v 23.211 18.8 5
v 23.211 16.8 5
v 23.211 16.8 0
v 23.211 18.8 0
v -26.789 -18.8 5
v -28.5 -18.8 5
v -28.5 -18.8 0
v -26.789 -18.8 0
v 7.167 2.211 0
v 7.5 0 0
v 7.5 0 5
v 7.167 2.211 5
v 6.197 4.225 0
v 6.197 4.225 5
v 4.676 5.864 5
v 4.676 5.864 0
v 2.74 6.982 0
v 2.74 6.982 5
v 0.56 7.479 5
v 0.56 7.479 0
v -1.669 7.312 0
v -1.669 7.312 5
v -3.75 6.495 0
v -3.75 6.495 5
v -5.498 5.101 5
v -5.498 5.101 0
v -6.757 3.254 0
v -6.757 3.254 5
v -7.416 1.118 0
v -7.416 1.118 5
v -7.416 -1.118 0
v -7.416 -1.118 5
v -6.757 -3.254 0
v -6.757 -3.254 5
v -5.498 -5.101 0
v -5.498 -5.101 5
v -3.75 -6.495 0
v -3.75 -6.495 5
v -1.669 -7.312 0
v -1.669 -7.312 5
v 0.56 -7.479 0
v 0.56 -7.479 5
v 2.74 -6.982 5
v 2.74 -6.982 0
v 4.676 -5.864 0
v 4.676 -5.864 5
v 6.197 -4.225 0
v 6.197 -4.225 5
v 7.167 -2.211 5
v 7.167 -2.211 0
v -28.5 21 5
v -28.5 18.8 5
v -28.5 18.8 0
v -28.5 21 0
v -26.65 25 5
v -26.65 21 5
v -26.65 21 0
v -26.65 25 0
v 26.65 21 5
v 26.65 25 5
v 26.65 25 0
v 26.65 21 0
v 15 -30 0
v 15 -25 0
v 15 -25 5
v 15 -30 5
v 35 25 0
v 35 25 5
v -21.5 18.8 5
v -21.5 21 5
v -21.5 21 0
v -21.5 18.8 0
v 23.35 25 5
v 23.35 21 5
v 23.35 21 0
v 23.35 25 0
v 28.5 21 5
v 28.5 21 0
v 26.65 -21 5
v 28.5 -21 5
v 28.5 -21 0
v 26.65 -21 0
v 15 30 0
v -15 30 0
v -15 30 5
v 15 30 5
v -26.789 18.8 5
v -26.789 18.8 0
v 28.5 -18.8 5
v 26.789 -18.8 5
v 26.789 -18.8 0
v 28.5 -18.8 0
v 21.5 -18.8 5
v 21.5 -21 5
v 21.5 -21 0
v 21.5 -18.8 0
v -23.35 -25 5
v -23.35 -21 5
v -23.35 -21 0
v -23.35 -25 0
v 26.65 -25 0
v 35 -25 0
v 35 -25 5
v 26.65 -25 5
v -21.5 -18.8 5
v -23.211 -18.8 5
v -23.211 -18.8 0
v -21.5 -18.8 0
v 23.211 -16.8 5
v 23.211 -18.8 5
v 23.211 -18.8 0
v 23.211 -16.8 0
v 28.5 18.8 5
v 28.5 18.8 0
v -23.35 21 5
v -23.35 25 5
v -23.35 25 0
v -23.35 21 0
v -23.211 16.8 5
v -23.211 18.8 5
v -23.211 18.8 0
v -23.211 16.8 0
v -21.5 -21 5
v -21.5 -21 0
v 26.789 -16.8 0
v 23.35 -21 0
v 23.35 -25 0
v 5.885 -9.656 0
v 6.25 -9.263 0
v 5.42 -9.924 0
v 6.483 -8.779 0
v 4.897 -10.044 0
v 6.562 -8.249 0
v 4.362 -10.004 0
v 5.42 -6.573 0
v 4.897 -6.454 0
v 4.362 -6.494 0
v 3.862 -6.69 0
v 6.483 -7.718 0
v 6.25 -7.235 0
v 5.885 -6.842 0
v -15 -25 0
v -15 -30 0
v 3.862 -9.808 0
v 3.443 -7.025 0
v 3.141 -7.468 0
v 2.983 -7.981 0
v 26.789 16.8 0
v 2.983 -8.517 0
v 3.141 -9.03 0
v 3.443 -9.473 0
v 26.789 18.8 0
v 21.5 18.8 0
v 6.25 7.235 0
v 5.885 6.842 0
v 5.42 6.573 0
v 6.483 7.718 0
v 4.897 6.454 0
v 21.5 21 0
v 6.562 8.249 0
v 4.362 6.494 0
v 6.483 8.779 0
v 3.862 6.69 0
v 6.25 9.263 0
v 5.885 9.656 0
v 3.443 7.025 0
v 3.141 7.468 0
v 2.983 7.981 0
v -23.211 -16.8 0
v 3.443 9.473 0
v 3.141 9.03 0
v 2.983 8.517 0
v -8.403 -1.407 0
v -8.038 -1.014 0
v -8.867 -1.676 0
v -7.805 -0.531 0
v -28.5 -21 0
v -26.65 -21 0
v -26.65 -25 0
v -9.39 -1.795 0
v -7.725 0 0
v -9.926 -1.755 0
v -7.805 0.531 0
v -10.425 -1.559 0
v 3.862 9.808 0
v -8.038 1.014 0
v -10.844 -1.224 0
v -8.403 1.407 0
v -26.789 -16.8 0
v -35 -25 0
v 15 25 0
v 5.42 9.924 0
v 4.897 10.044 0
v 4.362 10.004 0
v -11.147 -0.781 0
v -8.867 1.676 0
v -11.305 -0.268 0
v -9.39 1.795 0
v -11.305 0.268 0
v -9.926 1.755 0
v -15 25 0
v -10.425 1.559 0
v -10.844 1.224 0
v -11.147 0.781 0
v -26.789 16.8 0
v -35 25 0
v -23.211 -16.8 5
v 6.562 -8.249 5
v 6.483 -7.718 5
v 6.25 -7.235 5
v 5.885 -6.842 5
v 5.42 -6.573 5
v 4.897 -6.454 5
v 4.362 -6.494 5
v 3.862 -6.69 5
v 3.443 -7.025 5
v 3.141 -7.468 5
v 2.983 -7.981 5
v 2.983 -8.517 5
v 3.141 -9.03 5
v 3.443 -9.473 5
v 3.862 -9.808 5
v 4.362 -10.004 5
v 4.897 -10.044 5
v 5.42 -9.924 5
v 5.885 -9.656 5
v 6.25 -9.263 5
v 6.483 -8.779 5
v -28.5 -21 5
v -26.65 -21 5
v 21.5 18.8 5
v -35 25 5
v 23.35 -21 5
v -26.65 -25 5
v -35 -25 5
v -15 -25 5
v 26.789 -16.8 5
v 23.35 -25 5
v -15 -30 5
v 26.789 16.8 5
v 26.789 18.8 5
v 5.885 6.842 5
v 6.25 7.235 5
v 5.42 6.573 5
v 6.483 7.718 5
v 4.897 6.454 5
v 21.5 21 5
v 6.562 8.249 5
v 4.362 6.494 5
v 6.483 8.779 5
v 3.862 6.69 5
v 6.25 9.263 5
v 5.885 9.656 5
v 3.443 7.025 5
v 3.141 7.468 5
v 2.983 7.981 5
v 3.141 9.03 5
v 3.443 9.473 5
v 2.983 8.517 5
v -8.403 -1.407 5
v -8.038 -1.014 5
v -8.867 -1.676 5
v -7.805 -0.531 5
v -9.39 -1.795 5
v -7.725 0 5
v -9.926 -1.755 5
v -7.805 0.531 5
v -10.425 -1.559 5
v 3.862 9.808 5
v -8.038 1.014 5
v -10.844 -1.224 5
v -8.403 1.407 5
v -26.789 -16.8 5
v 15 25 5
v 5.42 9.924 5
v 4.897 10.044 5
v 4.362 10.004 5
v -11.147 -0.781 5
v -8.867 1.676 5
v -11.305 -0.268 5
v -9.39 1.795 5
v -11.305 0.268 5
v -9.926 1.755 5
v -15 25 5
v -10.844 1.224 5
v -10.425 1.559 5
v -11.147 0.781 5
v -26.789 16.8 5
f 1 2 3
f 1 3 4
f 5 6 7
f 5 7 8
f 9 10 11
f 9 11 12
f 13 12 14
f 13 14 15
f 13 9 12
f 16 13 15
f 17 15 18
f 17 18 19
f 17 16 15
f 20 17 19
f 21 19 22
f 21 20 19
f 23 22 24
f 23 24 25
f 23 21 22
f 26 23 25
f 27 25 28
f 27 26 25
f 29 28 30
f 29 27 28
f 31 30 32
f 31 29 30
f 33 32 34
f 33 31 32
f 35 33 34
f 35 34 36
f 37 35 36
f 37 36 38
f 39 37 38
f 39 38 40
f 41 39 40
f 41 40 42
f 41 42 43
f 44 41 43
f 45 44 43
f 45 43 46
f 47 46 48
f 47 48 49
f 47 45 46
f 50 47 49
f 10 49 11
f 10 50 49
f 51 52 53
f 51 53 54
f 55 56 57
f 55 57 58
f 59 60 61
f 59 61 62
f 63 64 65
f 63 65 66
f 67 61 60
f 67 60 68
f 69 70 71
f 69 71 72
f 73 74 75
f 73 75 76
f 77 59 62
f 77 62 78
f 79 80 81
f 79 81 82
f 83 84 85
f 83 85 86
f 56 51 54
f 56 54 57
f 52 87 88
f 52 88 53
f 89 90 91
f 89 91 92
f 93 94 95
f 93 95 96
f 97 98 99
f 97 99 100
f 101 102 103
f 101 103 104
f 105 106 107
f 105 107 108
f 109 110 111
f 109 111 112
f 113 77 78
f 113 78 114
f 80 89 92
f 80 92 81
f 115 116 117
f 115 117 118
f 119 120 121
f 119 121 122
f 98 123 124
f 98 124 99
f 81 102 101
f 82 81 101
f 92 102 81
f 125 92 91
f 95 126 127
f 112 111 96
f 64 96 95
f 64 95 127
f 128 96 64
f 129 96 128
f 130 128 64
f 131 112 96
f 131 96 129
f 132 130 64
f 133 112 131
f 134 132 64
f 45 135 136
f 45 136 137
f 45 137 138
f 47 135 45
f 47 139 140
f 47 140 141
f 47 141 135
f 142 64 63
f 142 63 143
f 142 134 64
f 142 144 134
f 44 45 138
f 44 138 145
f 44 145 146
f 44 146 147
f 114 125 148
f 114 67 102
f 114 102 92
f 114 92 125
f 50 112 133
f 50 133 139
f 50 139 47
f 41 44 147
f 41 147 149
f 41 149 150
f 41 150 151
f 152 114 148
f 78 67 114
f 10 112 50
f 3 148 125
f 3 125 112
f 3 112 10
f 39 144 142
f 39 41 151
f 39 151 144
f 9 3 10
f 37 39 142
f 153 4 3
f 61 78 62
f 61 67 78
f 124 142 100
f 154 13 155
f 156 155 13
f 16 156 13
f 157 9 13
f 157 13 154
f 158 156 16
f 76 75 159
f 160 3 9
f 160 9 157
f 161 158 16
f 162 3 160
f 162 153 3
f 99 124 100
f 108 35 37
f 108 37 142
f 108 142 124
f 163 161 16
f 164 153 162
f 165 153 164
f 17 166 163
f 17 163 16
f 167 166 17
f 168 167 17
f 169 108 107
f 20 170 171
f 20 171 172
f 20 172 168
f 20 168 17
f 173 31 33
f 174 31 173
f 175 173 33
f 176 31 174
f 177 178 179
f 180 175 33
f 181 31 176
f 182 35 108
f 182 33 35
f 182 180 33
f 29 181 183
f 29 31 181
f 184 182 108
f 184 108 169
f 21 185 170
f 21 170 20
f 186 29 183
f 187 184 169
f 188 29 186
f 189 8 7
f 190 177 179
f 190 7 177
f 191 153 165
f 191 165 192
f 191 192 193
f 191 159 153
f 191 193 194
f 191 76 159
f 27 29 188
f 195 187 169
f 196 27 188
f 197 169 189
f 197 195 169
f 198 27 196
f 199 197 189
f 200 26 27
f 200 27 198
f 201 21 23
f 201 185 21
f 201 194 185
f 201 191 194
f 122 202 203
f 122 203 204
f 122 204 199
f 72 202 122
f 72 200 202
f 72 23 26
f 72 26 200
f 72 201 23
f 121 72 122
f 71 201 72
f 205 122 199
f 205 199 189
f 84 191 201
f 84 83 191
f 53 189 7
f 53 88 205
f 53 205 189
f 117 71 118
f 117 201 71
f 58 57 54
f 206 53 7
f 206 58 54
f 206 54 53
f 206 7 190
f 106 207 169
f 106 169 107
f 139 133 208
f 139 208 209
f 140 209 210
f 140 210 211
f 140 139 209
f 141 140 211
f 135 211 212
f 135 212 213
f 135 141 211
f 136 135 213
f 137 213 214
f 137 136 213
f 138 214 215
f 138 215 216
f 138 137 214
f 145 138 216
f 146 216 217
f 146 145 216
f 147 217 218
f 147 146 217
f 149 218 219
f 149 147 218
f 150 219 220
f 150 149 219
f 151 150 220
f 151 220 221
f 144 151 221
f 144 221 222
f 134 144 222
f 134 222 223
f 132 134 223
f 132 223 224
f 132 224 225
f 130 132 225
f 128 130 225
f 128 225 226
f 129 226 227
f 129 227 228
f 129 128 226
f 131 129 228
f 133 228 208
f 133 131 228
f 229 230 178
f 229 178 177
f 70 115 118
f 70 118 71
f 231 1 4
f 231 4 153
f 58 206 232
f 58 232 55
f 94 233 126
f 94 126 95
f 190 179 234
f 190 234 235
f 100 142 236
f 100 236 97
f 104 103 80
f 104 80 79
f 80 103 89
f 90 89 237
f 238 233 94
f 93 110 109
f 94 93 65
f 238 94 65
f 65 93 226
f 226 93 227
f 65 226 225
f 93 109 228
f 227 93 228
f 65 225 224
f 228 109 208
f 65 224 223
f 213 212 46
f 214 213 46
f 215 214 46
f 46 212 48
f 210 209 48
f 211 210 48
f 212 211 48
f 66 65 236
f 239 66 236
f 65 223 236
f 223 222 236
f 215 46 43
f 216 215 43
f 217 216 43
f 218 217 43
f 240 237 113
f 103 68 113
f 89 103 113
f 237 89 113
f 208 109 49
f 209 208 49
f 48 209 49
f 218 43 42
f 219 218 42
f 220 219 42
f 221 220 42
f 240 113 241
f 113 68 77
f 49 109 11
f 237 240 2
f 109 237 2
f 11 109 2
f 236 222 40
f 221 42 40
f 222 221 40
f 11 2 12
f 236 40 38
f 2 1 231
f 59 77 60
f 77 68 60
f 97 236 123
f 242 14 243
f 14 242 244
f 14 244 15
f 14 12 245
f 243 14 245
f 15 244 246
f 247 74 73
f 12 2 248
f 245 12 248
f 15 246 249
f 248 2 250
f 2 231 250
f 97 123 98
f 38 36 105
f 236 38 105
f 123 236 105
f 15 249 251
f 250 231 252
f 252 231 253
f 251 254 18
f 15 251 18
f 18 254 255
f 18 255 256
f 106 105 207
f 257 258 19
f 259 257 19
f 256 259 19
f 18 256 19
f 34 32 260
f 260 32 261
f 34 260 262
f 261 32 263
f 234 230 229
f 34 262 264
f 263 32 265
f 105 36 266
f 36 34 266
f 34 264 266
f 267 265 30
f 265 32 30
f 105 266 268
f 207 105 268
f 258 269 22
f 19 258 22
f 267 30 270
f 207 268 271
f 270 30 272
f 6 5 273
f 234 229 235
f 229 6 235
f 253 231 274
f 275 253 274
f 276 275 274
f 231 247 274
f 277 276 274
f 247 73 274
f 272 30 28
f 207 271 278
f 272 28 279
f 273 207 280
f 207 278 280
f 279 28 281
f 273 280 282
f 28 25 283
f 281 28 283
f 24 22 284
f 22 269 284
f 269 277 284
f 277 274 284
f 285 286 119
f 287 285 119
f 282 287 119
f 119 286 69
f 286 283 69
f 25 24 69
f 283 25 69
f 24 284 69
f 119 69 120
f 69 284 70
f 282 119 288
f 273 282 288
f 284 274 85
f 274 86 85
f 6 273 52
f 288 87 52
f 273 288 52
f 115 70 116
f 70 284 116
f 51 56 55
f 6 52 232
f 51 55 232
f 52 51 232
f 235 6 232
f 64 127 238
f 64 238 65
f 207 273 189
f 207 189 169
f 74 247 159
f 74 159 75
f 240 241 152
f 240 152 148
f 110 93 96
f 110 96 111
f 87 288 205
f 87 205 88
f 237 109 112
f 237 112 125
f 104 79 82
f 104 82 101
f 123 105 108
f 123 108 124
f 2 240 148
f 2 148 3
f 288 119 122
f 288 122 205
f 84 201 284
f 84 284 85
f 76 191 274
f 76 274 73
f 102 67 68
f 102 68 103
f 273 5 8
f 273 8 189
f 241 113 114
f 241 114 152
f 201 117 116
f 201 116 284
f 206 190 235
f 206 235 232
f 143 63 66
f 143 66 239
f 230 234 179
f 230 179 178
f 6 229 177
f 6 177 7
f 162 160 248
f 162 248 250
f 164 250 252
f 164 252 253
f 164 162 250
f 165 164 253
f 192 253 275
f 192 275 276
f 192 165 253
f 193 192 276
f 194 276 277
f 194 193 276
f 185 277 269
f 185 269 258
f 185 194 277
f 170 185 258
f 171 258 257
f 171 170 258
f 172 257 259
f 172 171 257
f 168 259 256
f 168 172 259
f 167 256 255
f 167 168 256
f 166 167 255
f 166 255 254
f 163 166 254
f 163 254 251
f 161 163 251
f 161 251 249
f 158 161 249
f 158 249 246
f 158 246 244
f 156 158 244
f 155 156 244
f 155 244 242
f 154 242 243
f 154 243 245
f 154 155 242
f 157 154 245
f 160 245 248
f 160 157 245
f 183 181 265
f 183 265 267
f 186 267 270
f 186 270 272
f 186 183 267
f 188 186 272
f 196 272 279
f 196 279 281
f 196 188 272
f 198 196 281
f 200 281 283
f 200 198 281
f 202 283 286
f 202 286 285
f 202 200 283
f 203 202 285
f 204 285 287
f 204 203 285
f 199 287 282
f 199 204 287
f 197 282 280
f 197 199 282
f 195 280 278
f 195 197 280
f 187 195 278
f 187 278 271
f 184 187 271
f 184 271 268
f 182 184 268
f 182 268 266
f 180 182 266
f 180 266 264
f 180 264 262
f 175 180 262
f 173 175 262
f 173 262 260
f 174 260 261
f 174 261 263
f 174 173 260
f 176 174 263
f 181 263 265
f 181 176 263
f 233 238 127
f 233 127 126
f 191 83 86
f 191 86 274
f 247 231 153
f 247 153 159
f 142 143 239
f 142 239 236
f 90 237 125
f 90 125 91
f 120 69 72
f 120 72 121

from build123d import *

# Parameters (mm, degrees)
SKETCH1_R           = 7.5
SKETCH1_R_2         = 1.8
BOSS_EXTRUDE1_DEPTH = 5
CUT_EXTRUDE1_DEPTH  = 6


with BuildPart() as part:
    # Sketch1 → Boss-Extrude1 (new body)
    with BuildSketch(Plane.XY):
        Polygon((-15, 30), (15, 30), (15, 25), (35, 25), (35, -25), (15, -25), (15, -30), (-15, -30), (-15, -25), (-35, -25), (-35, 25), (-15, 25), align=None)
        Circle(SKETCH1_R, mode=Mode.SUBTRACT)
        with Locations((4.7625, -8.248891971)):
            Circle(SKETCH1_R_2, mode=Mode.SUBTRACT)
        with Locations((-9.525, 0)):
            Circle(SKETCH1_R_2, mode=Mode.SUBTRACT)
        with Locations((4.7625, 8.248891971)):
            Circle(SKETCH1_R_2, mode=Mode.SUBTRACT)
    extrude(amount=BOSS_EXTRUDE1_DEPTH)

    # Sketch3 → Cut-Extrude1 (cut, through all)
    with BuildSketch(Plane.XY.offset(5)):
        Polygon((26.65, 25), (26.65, 21), (28.5, 21), (28.5, 18.8), (26.78859304, 18.8), (26.78859304, 16.8), (23.21140696, 16.8), (23.21140696, 18.8), (21.5, 18.8), (21.5, 21), (23.35, 21), (23.35, 25), align=None)
        Polygon((-23.35, 25), (-23.35, 21), (-21.5, 21), (-21.5, 18.8), (-23.21140696, 18.8), (-23.21140696, 16.8), (-26.78859304, 16.8), (-26.78859304, 18.8), (-28.5, 18.8), (-28.5, 21), (-26.65, 21), (-26.65, 25), align=None)
        Polygon((-26.65, -25), (-26.65, -21), (-28.5, -21), (-28.5, -18.8), (-26.78859304, -18.8), (-26.78859304, -16.8), (-23.21140696, -16.8), (-23.21140696, -18.8), (-21.5, -18.8), (-21.5, -21), (-23.35, -21), (-23.35, -25), align=None)
        Polygon((23.35, -25), (23.35, -21), (21.5, -21), (21.5, -18.8), (23.21140696, -18.8), (23.21140696, -16.8), (26.78859304, -16.8), (26.78859304, -18.8), (28.5, -18.8), (28.5, -21), (26.65, -21), (26.65, -25), align=None)
    extrude(amount=-CUT_EXTRUDE1_DEPTH, mode=Mode.SUBTRACT)


solid = part.part
